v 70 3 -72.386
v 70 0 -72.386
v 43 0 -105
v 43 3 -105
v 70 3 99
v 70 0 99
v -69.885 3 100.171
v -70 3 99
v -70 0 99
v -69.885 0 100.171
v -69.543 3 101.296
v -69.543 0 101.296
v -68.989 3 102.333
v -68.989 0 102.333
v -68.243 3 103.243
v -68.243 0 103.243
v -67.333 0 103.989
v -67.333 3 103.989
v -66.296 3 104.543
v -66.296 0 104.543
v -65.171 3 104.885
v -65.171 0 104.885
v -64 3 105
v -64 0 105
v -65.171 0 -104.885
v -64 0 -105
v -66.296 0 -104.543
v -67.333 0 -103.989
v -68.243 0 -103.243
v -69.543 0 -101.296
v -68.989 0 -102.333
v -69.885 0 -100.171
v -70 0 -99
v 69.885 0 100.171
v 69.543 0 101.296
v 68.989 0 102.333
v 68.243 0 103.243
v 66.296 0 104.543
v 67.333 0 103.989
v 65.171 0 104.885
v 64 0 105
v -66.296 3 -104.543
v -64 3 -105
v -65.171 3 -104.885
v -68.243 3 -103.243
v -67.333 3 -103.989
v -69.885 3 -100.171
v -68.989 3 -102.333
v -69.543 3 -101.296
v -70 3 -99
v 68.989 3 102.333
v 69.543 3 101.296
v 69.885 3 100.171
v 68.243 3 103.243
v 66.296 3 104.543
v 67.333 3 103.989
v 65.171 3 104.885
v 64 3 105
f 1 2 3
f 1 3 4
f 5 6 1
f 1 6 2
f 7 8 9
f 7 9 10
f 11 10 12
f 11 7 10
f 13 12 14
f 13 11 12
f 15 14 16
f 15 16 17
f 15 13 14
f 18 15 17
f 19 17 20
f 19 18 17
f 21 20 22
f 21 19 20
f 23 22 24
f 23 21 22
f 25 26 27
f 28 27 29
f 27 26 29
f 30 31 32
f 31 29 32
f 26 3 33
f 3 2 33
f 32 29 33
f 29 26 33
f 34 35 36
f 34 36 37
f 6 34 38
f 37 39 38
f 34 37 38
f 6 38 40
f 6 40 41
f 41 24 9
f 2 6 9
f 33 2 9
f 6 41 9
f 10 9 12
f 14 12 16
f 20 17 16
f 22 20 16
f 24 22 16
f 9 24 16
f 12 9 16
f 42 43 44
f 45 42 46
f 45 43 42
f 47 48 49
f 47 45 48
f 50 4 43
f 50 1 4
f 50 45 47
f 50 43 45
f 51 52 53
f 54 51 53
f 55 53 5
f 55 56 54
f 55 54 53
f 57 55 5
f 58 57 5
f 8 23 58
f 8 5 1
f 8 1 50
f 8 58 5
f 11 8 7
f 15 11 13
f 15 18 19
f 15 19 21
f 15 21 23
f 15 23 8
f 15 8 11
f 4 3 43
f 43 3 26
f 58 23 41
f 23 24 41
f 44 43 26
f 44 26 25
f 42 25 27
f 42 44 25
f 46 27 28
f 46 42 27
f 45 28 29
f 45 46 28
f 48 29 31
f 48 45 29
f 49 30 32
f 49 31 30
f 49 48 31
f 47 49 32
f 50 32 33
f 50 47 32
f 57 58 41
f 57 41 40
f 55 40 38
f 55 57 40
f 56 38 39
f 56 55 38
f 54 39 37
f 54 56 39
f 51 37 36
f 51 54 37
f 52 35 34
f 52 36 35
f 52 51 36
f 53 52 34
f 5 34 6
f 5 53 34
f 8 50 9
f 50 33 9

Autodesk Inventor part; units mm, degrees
ref_plane "YZ Plane" through (0, 0, 0) normal (1, 0, 0) x (0, 1, 0)
ref_plane "XZ Plane" through (0, 0, 0) normal (0, 1, 0) x (-1, 0, 0)
ref_plane "XY Plane" through (0, 0, 0) normal (0, 0, 1) x (1, 0, 0)
sketch "Sketch1" plane through (0, 0, 0) normal (0, 1, 0) x (-1, 0, 0)
  line L0 (70, 105) -> (-70, 105)
  line L1 (-70, 105) -> (-70, -105)
  line L2 (-70, -105) -> (70, -105)
  line L3 (70, -105) -> (70, 105)
  line L4 (70, 105) -> (-70, -105) construction
  point P0 (0, 0)
  point P1 (0, 0)
  dimension "d0" = 140
  dimension "d1" = 210
extrude "Plate1" add sketch "Sketch1" along normal blind 3
fillet "Corner Round1" radius 6 3 edges at (70, 1.5, 105) (-70, 1.5, 105) (-70, 1.5, -105)
chamfer "Corner Chamfer1" distance 27 angle 50.38 1 edges at (70, 1.5, -105) measured on face at (25.3333, 1, -105)
equation "\"d2\" = Thickness"
equation "\"BendReliefWidth\" = Thickness"
equation "\"BendReliefDepth\" = 0.5 * Thickness"
equation "\"CornerReliefSize\" = 4 * Thickness"
equation "\"MinimumRemnant\" = 2 * Thickness"
equation "\"TransitionRadius\" = BendRadius"
equation "\"JacobiRadiusSize\" = BendRadius"
equation "\"GapSize\" = Thickness"
equation "\"Thickness\" = 3"
equation "\"BendRadius\" = 5"
properties part number "MSC 909 TUBE SUPPORT 3" material "Stainless Steel"
